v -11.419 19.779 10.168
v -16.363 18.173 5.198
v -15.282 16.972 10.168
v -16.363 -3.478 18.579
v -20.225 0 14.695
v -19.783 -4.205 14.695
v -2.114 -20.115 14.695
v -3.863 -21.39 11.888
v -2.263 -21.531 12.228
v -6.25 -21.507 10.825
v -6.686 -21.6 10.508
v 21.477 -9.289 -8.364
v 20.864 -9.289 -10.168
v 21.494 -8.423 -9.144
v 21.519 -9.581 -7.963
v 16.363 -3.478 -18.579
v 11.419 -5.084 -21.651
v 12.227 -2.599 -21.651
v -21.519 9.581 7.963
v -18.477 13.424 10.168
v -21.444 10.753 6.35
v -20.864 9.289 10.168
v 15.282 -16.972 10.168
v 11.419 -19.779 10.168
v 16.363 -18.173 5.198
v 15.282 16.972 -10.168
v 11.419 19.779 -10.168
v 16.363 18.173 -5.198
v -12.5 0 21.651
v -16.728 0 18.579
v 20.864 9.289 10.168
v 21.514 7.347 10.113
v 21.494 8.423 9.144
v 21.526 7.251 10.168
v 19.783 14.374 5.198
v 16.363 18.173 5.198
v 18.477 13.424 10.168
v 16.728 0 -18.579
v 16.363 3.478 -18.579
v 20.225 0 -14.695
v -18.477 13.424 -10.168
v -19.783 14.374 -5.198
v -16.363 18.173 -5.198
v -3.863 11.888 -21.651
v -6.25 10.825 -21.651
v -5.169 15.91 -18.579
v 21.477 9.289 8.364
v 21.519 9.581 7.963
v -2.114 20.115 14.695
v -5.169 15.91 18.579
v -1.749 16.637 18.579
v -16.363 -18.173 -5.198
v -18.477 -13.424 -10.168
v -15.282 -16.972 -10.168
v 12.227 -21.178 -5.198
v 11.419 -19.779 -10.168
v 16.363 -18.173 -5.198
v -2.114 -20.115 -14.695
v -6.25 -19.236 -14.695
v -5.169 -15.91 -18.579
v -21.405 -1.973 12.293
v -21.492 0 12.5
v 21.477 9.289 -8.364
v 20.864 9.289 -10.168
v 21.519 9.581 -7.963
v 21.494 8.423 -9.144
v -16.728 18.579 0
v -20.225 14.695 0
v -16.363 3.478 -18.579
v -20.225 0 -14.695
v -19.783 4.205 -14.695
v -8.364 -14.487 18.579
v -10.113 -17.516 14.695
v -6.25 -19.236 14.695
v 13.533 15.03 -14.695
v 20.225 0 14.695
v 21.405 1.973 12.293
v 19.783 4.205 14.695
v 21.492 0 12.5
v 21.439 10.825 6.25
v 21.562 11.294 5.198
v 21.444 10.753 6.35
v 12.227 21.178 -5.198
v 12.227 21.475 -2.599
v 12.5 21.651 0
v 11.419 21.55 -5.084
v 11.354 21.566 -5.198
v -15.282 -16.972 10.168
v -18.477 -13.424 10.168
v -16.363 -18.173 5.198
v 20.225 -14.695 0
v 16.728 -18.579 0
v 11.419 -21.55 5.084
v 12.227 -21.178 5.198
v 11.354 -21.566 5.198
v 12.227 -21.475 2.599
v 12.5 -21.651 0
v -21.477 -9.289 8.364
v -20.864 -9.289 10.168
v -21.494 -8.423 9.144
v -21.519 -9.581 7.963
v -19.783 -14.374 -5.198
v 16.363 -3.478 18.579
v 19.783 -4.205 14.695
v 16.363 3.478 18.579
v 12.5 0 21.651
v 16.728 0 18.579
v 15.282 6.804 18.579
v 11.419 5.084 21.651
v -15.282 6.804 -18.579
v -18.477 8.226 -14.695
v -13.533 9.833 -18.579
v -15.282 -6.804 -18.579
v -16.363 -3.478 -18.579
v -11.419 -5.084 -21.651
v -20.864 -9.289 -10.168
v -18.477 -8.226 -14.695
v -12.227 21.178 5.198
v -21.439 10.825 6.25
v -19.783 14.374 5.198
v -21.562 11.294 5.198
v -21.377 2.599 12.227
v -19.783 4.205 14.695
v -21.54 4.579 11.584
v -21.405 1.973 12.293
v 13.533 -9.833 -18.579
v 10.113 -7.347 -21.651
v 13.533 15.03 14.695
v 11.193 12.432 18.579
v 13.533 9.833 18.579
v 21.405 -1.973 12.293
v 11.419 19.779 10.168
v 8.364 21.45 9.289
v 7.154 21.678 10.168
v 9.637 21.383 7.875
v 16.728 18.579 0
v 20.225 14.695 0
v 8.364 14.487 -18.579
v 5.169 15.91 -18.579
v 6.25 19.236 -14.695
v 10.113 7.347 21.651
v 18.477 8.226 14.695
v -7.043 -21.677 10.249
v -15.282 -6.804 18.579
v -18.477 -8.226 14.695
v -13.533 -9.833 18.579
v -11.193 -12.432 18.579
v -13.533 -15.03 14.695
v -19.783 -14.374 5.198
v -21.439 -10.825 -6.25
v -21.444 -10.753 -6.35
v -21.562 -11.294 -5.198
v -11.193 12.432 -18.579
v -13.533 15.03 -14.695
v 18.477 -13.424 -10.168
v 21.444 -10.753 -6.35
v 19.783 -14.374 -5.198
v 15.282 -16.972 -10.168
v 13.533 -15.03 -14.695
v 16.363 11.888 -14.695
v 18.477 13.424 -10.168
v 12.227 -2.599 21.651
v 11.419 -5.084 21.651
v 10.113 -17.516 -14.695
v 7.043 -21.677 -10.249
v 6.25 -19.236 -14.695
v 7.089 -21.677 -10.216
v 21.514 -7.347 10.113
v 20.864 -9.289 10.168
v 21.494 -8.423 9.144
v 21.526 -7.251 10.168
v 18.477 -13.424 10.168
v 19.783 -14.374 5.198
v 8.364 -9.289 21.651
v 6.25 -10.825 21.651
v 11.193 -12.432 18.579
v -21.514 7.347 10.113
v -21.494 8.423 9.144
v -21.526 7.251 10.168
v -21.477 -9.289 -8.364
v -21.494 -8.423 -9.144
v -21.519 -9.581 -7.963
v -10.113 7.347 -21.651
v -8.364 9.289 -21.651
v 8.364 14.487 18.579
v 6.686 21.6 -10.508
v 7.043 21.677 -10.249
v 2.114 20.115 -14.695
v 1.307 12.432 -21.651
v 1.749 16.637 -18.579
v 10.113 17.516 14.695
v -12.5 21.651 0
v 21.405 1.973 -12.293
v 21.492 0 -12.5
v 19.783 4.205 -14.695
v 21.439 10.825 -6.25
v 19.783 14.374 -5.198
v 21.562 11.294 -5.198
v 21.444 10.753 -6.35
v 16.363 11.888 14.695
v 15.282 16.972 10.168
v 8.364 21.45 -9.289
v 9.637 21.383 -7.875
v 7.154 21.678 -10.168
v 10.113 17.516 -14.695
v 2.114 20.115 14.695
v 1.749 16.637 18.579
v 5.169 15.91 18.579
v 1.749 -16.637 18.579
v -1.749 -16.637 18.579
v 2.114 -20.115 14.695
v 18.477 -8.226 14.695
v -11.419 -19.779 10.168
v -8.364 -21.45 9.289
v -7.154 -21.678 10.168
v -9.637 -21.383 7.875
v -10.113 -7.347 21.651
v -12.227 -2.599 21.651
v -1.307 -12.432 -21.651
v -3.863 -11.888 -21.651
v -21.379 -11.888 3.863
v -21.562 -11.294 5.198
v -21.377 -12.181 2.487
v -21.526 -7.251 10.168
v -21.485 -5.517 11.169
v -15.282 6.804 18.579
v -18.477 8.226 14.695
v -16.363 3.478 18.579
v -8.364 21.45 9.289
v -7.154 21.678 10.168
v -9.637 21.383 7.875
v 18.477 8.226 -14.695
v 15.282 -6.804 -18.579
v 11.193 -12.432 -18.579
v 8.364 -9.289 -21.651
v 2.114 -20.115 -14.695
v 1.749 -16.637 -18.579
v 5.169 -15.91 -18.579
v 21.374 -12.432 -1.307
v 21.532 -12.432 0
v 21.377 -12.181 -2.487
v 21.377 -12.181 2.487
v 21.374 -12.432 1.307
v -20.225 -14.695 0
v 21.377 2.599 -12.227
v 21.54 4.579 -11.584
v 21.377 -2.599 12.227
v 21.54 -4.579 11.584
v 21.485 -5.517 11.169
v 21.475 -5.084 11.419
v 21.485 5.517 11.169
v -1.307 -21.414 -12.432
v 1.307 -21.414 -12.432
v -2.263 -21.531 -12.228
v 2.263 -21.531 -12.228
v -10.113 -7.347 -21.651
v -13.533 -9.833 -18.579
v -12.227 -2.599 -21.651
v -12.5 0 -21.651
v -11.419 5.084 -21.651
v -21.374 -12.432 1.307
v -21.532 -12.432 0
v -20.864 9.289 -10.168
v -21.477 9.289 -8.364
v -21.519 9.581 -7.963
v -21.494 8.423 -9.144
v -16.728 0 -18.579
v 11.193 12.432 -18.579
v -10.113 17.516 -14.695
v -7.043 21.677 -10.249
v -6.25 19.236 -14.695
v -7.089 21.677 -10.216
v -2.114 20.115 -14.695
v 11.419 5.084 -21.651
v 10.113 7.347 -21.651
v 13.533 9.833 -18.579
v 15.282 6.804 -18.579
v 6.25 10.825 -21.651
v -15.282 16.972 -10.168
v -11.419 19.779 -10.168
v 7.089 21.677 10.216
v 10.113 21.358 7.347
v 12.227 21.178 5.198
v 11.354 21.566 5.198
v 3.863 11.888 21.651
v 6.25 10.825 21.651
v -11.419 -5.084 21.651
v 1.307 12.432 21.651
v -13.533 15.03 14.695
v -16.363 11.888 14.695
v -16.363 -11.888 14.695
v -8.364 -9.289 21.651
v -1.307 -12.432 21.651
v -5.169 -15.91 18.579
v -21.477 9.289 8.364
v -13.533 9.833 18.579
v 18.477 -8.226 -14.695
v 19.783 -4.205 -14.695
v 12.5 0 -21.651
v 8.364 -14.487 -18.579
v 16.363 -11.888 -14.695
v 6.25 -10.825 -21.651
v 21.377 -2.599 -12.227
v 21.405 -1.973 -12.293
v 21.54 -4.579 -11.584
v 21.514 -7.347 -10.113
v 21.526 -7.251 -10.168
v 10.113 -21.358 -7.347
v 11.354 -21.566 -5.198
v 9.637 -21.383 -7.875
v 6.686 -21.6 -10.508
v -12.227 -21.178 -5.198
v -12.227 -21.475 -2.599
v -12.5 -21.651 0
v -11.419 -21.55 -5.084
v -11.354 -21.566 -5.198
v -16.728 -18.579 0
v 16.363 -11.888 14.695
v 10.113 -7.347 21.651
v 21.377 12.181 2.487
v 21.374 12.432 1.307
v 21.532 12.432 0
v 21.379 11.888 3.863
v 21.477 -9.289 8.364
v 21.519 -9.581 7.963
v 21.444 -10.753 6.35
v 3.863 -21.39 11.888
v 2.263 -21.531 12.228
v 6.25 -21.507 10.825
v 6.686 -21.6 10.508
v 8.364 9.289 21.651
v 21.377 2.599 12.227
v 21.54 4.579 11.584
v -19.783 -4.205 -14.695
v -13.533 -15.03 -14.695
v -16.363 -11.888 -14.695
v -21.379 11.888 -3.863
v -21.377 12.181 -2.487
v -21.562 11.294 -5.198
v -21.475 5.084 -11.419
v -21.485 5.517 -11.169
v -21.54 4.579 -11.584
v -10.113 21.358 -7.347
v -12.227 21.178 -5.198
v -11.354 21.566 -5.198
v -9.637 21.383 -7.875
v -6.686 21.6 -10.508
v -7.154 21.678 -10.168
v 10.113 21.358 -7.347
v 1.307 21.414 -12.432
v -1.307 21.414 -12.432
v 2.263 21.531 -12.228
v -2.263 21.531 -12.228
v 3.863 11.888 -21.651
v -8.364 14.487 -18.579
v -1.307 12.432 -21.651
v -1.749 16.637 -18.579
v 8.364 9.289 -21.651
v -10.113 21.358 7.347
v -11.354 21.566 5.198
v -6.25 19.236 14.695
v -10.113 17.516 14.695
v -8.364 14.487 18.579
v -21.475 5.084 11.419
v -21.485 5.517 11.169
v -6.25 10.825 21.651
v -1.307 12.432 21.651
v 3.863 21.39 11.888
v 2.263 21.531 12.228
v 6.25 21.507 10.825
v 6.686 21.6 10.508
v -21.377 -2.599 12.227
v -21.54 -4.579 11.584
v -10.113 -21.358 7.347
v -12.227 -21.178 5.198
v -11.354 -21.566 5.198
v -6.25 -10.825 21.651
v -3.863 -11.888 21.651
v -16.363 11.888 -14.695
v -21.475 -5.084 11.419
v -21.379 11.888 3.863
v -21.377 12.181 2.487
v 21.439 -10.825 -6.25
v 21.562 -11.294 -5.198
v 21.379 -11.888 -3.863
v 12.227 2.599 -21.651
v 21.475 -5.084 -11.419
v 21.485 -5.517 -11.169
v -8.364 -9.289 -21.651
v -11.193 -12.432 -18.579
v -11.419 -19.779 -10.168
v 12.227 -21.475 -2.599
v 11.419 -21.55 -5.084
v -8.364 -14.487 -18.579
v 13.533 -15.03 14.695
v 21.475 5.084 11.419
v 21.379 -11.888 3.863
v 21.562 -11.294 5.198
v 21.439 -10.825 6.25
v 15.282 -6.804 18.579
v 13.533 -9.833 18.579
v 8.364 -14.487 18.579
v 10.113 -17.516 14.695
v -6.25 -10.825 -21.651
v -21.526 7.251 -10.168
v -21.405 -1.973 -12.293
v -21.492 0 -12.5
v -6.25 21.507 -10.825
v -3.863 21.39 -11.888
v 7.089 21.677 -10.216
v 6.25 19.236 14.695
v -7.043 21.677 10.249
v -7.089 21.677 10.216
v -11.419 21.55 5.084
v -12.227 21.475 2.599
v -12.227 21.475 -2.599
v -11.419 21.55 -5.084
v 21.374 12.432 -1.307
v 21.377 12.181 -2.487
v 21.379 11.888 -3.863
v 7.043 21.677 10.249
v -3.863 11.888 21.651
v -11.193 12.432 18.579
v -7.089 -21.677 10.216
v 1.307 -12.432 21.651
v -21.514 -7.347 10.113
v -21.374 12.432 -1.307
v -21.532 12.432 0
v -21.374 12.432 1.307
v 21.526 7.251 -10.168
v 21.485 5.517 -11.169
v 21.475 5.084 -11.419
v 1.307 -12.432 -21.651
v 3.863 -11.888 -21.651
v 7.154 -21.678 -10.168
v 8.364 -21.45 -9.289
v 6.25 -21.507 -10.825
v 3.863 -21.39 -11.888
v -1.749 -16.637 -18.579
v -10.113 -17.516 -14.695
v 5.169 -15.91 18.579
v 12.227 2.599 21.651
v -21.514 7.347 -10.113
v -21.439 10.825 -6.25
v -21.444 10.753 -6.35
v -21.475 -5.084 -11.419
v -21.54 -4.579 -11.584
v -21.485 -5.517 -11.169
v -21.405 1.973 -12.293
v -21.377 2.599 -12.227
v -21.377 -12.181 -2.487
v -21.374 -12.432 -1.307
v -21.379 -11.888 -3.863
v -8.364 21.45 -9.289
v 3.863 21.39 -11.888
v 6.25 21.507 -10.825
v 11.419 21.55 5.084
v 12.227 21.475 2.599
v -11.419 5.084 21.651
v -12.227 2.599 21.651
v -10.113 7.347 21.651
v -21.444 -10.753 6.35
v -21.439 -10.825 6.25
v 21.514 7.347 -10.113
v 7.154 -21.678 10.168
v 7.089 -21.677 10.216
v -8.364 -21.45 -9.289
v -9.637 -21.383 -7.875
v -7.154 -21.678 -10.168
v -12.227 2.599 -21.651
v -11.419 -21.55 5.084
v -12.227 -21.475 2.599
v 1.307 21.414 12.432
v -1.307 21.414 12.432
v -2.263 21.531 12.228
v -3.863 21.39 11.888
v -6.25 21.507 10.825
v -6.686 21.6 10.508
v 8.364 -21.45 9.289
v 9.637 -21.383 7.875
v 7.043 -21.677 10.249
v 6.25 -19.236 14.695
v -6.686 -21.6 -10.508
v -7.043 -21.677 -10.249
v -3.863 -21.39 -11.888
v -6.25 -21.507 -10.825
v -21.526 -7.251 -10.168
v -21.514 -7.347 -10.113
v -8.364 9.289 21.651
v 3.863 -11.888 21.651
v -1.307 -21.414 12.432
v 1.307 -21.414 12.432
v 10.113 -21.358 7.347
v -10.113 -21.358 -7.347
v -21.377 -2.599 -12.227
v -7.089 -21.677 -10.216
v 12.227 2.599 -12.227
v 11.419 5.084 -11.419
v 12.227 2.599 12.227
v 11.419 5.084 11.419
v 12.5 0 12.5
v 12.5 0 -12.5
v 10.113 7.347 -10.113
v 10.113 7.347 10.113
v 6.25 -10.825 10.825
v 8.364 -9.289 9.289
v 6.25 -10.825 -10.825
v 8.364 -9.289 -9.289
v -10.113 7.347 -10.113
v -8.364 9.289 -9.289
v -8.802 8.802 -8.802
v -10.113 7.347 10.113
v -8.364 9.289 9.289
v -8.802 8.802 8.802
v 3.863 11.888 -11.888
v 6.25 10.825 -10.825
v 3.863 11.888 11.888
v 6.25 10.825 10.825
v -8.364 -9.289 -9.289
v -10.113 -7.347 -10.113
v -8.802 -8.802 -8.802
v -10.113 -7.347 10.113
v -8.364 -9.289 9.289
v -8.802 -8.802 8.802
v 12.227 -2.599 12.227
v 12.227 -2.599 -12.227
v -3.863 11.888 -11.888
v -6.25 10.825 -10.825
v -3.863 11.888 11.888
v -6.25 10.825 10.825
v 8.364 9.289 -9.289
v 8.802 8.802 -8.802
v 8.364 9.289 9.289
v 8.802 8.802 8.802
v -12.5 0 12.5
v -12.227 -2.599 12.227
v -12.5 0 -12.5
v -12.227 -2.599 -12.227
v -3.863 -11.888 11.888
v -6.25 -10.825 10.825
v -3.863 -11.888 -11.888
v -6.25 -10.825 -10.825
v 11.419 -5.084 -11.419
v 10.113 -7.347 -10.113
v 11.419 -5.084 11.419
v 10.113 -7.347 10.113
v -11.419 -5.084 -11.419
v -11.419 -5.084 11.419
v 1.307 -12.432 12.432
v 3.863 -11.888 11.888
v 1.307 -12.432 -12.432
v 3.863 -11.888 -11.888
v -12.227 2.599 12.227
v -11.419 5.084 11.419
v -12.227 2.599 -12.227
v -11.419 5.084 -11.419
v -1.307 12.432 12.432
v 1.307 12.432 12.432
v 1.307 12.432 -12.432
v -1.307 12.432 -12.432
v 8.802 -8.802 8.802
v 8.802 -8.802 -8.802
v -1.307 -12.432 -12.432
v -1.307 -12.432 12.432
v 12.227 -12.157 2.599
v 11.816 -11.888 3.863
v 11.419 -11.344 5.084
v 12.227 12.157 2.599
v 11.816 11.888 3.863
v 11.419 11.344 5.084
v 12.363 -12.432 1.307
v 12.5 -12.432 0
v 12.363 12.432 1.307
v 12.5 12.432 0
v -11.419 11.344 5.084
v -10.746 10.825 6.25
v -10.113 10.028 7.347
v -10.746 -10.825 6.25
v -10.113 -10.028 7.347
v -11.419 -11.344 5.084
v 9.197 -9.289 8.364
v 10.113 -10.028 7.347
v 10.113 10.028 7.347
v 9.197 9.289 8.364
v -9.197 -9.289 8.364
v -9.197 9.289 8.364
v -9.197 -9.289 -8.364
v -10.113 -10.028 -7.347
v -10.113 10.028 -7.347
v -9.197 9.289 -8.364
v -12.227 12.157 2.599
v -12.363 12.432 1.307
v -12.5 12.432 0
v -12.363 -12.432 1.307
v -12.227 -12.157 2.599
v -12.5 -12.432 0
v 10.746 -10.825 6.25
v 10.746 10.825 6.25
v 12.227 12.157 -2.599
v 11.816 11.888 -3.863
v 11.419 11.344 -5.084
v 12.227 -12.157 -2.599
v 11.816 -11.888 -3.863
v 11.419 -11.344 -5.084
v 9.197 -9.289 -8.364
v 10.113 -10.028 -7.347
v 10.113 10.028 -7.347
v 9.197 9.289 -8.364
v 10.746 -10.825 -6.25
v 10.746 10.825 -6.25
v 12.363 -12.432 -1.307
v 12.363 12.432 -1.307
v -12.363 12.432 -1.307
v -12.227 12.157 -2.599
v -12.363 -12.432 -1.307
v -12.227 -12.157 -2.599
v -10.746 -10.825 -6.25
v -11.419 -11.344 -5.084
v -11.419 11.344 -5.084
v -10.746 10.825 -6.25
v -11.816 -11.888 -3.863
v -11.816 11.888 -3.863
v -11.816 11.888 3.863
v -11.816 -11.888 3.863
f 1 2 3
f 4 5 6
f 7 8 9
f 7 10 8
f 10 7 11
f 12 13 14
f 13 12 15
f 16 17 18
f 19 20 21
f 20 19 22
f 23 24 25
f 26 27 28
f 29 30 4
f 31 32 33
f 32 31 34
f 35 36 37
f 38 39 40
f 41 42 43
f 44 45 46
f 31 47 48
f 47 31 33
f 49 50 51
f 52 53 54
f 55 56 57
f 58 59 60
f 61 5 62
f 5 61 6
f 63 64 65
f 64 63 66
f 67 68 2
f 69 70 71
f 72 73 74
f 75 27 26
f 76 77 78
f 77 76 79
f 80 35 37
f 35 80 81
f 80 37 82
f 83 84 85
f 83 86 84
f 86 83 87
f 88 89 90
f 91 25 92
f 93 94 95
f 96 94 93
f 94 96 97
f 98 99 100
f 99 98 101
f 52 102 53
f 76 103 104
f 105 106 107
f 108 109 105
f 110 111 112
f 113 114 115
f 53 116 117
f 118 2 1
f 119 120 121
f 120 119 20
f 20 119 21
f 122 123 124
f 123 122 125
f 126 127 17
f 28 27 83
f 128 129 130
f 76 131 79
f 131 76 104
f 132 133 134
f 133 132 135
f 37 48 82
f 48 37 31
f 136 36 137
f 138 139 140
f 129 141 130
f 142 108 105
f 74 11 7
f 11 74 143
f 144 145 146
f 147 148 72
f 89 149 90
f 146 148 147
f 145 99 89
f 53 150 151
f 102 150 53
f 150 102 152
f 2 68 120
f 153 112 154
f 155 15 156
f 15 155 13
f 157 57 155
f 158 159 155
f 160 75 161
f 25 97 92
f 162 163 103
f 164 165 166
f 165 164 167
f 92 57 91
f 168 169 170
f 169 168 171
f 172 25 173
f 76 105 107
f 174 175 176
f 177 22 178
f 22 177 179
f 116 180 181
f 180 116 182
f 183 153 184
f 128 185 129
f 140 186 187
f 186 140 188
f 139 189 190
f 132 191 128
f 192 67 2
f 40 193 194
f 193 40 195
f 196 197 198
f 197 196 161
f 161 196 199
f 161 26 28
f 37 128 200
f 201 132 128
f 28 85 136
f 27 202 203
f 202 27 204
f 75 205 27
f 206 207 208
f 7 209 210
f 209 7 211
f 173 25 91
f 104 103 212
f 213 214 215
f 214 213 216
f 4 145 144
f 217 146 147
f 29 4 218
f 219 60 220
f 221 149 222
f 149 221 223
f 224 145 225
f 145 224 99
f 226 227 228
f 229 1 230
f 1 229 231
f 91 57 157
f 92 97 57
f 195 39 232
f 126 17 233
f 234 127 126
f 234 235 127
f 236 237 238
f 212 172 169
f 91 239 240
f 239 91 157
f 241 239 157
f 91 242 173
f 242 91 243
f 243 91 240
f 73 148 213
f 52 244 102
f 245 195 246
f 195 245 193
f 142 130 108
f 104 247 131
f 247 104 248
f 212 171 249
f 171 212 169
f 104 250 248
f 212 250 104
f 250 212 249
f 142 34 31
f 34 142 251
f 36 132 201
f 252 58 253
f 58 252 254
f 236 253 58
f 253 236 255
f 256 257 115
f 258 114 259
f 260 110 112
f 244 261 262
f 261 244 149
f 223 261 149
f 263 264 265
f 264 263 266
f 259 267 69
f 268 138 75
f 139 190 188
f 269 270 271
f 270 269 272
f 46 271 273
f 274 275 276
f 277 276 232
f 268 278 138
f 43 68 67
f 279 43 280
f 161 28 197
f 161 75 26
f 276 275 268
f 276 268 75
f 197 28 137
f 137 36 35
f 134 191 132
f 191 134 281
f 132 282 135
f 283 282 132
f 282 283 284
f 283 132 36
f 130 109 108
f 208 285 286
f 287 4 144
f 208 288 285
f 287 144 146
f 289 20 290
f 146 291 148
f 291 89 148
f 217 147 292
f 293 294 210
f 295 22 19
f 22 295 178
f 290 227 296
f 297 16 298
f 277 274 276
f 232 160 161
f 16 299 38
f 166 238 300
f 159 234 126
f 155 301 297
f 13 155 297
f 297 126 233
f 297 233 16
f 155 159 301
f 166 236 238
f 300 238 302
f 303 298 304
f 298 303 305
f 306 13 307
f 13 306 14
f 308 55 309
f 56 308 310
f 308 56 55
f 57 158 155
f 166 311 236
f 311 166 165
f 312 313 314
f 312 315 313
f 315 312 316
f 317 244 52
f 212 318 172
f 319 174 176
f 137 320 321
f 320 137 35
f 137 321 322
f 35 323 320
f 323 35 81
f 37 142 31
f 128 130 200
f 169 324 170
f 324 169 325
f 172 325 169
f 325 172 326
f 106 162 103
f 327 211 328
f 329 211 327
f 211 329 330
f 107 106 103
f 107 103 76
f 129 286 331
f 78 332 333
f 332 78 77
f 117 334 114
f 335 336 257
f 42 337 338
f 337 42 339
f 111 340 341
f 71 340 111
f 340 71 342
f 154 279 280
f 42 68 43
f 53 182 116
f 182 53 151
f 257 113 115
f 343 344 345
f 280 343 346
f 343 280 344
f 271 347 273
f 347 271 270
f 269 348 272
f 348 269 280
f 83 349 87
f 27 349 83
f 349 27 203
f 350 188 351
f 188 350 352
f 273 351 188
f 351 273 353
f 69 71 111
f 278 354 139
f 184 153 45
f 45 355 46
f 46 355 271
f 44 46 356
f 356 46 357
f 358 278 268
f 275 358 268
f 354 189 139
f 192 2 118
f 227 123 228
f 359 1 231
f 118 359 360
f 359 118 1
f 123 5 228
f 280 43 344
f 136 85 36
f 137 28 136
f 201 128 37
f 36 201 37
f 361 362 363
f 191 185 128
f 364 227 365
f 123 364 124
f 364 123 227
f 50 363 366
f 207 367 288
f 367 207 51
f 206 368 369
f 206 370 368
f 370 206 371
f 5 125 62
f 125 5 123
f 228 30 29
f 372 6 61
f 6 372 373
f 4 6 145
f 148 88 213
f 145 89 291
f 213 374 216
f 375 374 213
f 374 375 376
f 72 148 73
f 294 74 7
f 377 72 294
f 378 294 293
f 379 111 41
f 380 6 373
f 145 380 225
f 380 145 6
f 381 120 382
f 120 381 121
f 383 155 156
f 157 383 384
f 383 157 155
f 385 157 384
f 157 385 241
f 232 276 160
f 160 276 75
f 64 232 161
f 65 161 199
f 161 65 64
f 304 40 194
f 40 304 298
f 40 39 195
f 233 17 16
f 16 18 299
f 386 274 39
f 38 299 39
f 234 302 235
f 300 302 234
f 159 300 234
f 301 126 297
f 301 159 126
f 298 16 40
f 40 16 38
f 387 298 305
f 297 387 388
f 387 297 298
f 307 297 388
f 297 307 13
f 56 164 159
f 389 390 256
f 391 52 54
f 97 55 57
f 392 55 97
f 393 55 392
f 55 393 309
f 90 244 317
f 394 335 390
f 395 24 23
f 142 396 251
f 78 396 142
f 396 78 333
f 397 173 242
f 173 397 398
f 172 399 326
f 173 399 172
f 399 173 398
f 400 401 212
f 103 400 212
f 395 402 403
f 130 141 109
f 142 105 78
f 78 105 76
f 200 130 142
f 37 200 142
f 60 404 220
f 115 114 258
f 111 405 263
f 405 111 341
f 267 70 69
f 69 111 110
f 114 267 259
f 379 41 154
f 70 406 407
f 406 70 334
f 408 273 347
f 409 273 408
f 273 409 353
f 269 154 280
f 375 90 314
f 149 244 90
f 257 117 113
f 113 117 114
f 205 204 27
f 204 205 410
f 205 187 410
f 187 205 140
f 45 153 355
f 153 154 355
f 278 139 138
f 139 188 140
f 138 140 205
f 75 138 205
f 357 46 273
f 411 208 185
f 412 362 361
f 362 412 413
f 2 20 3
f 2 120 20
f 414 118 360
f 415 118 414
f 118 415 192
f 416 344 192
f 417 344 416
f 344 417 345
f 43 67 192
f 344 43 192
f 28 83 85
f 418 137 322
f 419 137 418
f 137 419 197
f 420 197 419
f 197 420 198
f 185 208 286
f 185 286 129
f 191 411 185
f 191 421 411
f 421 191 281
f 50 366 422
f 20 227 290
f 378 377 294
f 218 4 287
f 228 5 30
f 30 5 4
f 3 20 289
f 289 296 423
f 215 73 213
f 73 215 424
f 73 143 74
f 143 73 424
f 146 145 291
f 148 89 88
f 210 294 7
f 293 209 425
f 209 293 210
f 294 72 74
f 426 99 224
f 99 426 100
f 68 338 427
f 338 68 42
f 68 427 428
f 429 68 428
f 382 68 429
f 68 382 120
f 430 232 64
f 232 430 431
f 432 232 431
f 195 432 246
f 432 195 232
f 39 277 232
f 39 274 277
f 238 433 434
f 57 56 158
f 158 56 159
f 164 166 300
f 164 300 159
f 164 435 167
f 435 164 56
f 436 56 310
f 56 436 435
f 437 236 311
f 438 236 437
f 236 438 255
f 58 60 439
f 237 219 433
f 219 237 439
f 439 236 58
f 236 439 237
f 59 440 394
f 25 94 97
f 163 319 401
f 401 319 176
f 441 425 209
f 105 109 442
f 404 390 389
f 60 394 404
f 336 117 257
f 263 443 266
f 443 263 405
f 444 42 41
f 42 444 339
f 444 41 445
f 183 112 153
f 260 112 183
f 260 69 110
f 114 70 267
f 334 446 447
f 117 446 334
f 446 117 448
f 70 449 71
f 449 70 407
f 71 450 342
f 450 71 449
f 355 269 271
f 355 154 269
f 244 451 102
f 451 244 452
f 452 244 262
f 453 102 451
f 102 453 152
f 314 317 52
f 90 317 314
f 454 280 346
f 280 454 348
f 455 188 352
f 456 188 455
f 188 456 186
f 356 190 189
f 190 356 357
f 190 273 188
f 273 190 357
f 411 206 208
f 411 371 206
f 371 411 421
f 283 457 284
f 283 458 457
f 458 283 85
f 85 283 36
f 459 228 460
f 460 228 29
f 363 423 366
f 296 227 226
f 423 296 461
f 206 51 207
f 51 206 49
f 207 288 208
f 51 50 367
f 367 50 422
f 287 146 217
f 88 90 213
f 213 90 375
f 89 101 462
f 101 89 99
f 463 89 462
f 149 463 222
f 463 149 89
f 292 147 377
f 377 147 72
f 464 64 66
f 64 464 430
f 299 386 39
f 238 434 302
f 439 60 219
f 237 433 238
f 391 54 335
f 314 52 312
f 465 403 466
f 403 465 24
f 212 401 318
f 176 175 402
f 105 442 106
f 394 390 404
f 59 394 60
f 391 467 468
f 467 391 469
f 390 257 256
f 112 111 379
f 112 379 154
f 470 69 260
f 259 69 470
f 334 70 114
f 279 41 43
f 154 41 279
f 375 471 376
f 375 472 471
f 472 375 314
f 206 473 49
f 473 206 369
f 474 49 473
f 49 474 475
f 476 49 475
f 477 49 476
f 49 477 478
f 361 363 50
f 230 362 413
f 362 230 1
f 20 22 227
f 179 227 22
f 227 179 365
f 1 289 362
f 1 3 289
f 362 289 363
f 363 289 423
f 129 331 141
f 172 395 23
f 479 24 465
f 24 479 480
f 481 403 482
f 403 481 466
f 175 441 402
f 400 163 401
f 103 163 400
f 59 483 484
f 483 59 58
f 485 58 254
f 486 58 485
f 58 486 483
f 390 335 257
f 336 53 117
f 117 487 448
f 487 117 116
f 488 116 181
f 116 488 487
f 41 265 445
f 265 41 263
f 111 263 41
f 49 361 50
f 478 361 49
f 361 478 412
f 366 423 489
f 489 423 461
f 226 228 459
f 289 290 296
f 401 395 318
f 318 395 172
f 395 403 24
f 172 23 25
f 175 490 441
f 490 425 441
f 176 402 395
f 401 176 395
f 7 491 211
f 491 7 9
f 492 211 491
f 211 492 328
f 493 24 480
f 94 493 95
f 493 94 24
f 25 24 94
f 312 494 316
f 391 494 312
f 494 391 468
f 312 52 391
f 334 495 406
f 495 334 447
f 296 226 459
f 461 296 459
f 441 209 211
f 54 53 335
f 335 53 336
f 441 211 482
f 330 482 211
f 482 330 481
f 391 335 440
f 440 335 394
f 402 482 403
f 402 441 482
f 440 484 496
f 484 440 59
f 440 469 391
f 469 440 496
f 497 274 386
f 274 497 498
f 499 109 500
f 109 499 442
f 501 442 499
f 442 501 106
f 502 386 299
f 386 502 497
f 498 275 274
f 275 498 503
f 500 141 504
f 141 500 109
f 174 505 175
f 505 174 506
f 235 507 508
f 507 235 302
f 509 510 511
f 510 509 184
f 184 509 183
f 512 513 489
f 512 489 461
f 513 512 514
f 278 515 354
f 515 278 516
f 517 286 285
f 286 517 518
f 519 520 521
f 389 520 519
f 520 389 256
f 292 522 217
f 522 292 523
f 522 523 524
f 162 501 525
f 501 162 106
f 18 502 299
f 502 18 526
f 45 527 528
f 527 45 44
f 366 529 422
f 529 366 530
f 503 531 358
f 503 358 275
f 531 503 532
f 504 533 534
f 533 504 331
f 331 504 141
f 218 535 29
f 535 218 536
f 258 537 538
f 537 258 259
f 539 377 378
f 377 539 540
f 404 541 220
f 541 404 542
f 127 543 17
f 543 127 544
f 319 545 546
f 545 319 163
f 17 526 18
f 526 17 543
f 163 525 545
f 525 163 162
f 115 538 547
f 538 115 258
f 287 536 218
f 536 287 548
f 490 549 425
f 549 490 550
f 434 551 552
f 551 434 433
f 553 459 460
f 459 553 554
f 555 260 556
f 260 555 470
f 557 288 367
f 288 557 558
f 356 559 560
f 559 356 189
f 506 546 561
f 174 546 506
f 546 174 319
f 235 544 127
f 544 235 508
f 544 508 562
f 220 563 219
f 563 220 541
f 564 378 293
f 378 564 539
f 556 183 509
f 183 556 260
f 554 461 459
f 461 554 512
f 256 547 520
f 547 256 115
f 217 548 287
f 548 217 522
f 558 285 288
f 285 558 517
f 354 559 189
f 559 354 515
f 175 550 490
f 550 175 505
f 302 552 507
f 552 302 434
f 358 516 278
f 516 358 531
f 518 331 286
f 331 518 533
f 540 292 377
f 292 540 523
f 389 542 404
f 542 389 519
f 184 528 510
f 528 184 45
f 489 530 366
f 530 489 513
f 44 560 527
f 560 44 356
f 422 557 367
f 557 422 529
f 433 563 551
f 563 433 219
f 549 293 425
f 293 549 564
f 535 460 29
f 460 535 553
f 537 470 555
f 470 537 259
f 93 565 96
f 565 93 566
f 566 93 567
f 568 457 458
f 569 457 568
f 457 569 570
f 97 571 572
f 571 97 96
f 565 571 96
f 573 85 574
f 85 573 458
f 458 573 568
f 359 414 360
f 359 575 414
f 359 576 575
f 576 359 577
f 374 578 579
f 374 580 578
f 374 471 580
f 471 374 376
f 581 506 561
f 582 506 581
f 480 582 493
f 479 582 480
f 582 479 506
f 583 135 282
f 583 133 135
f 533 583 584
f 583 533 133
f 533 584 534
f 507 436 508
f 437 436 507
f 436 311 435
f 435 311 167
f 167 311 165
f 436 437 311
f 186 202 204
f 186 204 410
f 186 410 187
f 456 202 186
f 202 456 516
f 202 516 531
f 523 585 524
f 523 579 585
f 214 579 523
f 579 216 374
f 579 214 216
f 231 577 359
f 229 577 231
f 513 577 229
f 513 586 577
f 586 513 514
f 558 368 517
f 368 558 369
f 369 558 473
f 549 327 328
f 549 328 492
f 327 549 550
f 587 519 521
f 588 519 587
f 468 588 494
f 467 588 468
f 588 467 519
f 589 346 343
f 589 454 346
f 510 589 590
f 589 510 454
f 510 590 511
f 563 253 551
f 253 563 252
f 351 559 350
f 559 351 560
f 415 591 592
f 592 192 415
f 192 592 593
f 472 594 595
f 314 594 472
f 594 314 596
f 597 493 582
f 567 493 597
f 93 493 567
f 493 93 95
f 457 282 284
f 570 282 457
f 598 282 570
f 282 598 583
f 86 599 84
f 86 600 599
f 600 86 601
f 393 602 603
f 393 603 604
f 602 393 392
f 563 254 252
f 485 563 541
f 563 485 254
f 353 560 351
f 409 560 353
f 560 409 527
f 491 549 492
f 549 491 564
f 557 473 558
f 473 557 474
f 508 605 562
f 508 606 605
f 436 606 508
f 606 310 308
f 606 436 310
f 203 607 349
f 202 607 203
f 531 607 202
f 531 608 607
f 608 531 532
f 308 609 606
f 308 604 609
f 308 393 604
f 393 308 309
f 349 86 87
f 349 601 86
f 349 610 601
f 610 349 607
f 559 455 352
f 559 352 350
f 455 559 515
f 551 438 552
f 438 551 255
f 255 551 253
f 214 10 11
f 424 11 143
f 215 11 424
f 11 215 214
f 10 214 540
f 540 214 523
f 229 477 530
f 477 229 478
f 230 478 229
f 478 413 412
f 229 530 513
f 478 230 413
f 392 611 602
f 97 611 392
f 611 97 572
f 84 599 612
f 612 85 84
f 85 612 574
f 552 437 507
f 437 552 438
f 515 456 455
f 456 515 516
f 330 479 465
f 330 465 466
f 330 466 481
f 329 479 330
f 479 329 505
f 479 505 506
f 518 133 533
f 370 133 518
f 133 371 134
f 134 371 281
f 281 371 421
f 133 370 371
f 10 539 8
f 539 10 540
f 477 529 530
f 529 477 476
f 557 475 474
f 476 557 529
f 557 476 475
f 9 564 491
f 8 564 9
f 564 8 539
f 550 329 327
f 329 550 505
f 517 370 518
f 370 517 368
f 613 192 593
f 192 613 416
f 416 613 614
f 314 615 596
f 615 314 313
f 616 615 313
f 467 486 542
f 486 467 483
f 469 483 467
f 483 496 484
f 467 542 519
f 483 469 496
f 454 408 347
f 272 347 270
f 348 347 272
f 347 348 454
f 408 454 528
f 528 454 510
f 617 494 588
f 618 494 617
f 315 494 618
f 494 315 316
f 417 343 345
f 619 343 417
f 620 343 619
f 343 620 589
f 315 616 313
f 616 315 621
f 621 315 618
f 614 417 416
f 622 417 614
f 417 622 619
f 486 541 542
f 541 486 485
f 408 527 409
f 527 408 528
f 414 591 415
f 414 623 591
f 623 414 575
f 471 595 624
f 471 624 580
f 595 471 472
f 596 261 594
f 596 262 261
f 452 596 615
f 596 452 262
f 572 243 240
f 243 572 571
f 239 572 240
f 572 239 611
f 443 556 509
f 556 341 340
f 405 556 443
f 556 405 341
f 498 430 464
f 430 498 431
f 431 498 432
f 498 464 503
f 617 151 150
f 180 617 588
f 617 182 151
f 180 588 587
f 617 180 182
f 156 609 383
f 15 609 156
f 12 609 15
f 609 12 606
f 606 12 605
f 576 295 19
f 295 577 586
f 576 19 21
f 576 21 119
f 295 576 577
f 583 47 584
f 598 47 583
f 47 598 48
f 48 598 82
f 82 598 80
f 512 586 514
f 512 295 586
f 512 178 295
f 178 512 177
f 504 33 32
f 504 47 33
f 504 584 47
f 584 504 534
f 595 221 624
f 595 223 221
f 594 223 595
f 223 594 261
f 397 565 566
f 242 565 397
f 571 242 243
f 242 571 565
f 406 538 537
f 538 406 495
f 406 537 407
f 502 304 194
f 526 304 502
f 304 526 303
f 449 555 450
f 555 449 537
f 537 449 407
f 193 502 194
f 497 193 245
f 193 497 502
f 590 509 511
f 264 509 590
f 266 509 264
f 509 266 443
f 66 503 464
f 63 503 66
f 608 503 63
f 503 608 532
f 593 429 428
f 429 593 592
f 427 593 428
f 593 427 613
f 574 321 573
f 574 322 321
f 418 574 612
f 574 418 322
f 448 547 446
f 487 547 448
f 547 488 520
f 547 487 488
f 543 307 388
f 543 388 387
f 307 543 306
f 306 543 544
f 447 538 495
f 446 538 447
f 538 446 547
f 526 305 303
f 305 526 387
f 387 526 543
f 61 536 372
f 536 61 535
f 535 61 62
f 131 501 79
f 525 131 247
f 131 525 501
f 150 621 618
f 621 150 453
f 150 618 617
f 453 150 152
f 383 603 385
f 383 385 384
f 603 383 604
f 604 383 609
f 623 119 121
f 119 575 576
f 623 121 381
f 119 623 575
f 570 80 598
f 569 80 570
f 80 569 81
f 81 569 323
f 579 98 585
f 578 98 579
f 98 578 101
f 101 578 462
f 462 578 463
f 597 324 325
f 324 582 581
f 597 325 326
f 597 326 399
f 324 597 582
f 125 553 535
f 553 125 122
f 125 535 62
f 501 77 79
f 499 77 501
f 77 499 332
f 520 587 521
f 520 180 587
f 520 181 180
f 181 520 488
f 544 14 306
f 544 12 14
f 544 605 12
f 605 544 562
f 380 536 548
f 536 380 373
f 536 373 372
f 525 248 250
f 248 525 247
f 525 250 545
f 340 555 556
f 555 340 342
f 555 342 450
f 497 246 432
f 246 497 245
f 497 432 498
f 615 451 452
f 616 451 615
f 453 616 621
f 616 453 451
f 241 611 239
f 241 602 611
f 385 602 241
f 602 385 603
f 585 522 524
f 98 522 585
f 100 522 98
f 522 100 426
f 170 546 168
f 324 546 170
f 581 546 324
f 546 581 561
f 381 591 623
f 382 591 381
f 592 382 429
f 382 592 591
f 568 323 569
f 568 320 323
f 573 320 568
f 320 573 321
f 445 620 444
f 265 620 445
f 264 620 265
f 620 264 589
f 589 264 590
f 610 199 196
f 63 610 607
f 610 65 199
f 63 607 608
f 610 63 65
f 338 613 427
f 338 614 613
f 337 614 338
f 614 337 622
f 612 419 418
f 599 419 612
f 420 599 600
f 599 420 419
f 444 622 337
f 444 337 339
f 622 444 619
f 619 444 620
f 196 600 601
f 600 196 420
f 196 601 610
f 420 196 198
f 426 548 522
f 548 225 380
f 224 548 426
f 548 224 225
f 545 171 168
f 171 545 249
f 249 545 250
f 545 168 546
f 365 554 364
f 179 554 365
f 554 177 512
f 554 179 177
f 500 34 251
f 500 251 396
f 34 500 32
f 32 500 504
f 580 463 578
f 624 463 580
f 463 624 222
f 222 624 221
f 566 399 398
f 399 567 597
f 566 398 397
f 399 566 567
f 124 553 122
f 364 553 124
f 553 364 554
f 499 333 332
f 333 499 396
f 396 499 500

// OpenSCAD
module example001() {
    function r_from_dia(d) = d / 2;

    module rotcy(rot, r, h) {
        rotate(90, rot)
            cylinder(r = r, h = h, center = true);
    }

    difference() {
        sphere(r = r_from_dia(size));
        rotcy([0, 0, 0], cy_r, cy_h);
        rotcy([1, 0, 0], cy_r, cy_h);
        rotcy([0, 1, 0], cy_r, cy_h);
    }

    size = 50;
    hole = 25;

    cy_r = r_from_dia(hole);
    cy_h = r_from_dia(size * 2.5);
}

echo(version = version());

example001();

// Written by Clifford Wolf <clifford@clifford.at> and Marius
// Kintel <marius@kintel.net>
//
// To the extent possible under law, the author(s) have dedicated all
// copyright and related and neighboring rights to this software to the
// public domain worldwide. This software is distributed without any
// warranty.
//
// You should have received a copy of the CC0 Public Domain
// Dedication along with this software.
// If not, see <http://creativecommons.org/publicdomain/zero/1.0/>.
